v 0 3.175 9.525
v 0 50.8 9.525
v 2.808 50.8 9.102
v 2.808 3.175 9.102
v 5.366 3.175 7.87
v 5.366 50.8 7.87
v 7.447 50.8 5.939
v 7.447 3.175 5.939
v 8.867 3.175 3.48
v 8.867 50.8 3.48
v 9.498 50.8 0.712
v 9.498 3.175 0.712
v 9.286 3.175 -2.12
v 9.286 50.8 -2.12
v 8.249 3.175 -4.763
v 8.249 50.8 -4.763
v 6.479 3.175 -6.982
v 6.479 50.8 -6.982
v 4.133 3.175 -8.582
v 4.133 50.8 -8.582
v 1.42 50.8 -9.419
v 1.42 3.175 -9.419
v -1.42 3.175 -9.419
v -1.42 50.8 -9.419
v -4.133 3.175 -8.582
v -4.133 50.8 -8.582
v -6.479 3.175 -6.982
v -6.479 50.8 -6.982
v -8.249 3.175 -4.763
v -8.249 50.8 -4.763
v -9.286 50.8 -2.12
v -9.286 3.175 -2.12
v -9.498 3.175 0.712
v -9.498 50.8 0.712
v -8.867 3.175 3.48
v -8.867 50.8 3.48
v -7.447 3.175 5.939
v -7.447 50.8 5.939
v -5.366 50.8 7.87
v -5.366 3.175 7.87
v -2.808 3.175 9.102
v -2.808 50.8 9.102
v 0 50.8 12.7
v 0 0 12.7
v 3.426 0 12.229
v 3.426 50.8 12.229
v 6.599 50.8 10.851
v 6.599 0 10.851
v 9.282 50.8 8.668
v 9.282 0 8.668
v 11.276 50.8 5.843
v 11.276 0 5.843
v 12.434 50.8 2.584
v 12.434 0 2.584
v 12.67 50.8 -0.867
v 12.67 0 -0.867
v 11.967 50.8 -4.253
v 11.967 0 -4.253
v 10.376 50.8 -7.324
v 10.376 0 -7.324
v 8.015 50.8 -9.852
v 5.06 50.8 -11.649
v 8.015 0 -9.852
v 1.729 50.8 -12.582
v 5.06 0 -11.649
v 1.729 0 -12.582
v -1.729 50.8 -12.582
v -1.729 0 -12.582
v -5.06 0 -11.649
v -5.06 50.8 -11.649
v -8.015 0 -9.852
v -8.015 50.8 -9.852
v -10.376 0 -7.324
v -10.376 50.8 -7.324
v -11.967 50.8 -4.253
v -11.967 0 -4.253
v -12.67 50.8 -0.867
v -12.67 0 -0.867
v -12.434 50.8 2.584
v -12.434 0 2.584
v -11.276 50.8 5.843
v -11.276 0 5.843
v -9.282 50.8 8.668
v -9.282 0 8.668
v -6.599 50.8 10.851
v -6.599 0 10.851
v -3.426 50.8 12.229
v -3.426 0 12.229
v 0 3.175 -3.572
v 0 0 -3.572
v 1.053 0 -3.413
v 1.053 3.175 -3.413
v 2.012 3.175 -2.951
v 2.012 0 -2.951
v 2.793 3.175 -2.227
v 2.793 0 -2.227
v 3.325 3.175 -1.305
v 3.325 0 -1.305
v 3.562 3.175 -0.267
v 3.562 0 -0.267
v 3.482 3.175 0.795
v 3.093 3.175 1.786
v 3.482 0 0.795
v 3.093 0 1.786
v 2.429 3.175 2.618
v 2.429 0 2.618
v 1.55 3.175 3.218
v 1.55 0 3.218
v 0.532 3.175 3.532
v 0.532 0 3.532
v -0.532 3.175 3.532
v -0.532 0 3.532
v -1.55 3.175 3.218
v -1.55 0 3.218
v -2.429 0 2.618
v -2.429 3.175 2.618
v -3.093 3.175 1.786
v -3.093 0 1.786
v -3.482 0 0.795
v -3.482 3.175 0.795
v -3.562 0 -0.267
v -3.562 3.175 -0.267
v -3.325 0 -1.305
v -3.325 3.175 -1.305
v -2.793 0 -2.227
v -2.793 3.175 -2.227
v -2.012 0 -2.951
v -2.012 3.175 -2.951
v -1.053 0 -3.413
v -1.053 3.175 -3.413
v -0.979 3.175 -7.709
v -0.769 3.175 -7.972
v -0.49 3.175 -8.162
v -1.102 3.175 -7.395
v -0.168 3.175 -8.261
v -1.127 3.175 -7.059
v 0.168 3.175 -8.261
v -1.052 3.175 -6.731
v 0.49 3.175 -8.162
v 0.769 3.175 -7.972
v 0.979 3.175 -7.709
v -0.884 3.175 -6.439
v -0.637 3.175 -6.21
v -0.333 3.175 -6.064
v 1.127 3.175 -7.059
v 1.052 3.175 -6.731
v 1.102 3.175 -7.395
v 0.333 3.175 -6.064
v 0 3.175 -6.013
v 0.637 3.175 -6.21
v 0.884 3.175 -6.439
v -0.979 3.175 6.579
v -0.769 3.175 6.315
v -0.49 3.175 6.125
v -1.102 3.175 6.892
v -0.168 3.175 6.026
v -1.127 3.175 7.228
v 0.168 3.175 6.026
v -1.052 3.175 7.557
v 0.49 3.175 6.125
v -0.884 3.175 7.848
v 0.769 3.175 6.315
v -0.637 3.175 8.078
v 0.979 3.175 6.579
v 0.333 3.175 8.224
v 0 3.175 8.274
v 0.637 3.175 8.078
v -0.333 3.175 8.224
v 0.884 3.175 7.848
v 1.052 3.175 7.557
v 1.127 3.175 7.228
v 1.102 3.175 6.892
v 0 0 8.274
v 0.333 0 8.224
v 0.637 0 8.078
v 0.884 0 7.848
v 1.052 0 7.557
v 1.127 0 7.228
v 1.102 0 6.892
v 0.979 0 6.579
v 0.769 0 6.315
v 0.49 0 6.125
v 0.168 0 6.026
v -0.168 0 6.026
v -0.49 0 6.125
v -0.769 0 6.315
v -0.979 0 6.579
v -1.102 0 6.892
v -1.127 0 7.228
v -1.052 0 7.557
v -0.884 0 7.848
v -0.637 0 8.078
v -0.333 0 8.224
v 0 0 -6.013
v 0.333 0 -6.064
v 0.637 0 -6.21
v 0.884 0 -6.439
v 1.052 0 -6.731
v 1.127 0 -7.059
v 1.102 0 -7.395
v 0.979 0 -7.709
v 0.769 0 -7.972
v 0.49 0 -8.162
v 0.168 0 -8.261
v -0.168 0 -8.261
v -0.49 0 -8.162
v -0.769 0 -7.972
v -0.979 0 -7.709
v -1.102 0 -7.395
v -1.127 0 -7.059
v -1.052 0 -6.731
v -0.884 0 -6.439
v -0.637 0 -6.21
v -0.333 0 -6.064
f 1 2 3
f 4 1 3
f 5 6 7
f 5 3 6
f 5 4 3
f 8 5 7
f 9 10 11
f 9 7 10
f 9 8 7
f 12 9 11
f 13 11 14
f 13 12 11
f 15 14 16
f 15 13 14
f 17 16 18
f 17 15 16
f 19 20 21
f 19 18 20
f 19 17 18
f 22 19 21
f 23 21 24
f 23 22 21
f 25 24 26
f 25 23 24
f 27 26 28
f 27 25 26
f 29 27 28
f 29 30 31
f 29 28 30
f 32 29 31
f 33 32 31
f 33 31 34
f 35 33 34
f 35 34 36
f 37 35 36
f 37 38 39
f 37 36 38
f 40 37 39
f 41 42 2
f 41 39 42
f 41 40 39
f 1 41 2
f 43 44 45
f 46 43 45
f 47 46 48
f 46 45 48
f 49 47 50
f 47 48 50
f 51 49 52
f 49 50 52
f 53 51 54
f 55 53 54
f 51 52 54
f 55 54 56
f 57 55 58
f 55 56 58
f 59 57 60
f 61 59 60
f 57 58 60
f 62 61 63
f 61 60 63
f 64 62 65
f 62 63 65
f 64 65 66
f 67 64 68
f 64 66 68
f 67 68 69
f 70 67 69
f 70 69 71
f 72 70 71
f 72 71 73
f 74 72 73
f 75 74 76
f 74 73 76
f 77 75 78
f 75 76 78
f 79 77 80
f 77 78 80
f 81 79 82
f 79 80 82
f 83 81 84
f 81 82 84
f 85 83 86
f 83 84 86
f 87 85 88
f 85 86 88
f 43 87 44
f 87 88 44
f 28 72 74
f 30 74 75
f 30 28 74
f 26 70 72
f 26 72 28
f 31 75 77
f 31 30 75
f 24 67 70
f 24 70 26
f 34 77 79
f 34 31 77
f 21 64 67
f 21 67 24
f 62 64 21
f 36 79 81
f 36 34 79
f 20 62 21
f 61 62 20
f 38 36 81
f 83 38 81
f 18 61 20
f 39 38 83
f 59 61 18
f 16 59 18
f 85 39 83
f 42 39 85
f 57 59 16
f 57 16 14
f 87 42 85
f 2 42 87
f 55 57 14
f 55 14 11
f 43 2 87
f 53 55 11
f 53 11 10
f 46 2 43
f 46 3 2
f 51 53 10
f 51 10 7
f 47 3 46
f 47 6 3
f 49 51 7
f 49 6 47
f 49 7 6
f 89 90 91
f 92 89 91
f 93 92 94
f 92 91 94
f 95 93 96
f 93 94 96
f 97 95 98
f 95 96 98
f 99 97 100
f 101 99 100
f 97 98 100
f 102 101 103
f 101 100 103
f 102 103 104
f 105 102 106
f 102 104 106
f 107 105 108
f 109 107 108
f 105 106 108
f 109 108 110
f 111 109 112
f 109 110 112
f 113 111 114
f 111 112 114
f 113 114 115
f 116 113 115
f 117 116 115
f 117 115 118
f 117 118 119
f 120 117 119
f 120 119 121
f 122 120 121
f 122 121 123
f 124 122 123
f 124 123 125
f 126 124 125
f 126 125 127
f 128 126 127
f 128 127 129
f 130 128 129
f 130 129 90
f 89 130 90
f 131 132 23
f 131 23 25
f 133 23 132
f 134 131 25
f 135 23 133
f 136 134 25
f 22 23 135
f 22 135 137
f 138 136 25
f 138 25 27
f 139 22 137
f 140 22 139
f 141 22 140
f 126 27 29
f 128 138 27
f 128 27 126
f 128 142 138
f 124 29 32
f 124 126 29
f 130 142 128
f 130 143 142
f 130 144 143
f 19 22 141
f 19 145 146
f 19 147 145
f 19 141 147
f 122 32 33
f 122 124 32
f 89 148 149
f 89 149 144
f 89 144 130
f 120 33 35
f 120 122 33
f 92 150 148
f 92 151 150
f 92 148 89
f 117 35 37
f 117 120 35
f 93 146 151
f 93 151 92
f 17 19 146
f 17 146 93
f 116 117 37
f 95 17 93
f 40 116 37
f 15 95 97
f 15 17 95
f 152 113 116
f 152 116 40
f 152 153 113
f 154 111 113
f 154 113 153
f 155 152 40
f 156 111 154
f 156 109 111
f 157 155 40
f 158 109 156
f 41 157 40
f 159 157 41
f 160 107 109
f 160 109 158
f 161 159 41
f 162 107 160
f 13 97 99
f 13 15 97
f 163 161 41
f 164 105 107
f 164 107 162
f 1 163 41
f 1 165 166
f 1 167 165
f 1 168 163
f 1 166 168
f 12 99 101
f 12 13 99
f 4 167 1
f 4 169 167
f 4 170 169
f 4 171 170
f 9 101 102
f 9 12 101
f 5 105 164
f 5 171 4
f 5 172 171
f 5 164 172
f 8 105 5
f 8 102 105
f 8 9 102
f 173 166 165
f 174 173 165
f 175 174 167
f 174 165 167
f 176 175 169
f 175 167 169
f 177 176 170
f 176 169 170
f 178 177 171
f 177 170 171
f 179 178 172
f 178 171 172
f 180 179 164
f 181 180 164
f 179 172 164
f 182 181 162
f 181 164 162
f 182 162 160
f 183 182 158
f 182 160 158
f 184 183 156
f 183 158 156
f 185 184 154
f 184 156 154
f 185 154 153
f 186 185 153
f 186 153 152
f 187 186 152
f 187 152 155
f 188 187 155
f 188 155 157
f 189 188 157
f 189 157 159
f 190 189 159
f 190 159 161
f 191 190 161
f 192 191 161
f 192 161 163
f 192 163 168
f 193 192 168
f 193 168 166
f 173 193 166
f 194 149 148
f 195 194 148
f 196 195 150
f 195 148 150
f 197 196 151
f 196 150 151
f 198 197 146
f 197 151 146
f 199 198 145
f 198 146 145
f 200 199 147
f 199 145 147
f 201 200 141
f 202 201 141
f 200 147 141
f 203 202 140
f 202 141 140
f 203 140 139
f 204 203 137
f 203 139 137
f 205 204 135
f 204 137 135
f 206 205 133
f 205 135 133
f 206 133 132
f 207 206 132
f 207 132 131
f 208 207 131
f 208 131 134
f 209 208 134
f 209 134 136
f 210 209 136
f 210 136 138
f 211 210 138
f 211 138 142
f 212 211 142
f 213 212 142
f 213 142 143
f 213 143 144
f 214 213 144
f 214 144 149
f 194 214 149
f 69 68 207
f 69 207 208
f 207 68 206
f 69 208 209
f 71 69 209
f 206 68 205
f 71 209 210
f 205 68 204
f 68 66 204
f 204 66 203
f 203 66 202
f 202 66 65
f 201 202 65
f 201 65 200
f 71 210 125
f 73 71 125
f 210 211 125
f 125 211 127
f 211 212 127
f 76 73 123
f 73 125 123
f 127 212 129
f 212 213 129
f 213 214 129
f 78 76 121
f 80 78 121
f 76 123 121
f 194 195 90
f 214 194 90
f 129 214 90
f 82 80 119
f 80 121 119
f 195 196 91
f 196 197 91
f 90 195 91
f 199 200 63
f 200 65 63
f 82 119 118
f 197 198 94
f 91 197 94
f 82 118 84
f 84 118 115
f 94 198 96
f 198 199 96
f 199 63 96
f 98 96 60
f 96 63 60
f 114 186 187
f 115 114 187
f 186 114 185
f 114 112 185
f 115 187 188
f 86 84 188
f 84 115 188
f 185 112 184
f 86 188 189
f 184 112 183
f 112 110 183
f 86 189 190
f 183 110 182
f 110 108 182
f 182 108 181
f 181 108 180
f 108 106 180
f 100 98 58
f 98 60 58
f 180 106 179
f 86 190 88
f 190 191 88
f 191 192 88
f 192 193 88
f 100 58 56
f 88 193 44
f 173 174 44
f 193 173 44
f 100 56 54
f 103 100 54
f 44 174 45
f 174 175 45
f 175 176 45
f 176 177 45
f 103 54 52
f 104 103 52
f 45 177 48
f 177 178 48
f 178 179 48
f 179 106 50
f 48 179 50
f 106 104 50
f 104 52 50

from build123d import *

# Parameters (mm, degrees)
SKETCH1_R             = 12.7
EXTRUDE1_DEPTH        = 50.8
SHELL1_T              = -3.175
F_4_40_TAPPED_HOLE1_D = 2.2606
F_4_40_TAPPED_HOLE2_D = 2.2606
SKETCH8_R             = 3.571875
CUT_EXTRUDE1_DEPTH    = 54.881536726


with BuildPart() as part:
    # Sketch1 → Extrude1 (new body)
    with BuildSketch(Plane(origin=(0, 0, 0), x_dir=(1, 0, 0), z_dir=(0, 1, 0))):
        with Locations(Location((0, 0, 0), (0, 0, 270))):
            Circle(SKETCH1_R)
    extrude(amount=EXTRUDE1_DEPTH)

    # Shell1
    shell1_openings = [part.faces().sort_by_distance(p)[0] for p in [
        (0, 50.8, 0),
    ]]
    offset(amount=SHELL1_T, openings=shell1_openings, kind=Kind.INTERSECTION)

    # #4-40 Tapped Hole1 (through all)
    with Locations(Plane(origin=(0, 0, 7.14375), x_dir=(0, 0, -1), z_dir=(0, -1, 0))):
        with Locations((0, 0)):
            Hole(F_4_40_TAPPED_HOLE1_D / 2)

    # #4-40 Tapped Hole2 (through all)
    with Locations(Plane(origin=(0, 0, -7.14375), x_dir=(0, 0, -1), z_dir=(0, -1, 0))):
        with Locations((0, 0)):
            Hole(F_4_40_TAPPED_HOLE2_D / 2)

    # Sketch8 → Cut-Extrude1 (cut, through all)
    with BuildSketch(Plane.XZ):
        with Locations(Location((0, 0, 0), (0, 0, 270))):
            Circle(SKETCH8_R)
    extrude(amount=-CUT_EXTRUDE1_DEPTH, mode=Mode.SUBTRACT)


solid = part.part
